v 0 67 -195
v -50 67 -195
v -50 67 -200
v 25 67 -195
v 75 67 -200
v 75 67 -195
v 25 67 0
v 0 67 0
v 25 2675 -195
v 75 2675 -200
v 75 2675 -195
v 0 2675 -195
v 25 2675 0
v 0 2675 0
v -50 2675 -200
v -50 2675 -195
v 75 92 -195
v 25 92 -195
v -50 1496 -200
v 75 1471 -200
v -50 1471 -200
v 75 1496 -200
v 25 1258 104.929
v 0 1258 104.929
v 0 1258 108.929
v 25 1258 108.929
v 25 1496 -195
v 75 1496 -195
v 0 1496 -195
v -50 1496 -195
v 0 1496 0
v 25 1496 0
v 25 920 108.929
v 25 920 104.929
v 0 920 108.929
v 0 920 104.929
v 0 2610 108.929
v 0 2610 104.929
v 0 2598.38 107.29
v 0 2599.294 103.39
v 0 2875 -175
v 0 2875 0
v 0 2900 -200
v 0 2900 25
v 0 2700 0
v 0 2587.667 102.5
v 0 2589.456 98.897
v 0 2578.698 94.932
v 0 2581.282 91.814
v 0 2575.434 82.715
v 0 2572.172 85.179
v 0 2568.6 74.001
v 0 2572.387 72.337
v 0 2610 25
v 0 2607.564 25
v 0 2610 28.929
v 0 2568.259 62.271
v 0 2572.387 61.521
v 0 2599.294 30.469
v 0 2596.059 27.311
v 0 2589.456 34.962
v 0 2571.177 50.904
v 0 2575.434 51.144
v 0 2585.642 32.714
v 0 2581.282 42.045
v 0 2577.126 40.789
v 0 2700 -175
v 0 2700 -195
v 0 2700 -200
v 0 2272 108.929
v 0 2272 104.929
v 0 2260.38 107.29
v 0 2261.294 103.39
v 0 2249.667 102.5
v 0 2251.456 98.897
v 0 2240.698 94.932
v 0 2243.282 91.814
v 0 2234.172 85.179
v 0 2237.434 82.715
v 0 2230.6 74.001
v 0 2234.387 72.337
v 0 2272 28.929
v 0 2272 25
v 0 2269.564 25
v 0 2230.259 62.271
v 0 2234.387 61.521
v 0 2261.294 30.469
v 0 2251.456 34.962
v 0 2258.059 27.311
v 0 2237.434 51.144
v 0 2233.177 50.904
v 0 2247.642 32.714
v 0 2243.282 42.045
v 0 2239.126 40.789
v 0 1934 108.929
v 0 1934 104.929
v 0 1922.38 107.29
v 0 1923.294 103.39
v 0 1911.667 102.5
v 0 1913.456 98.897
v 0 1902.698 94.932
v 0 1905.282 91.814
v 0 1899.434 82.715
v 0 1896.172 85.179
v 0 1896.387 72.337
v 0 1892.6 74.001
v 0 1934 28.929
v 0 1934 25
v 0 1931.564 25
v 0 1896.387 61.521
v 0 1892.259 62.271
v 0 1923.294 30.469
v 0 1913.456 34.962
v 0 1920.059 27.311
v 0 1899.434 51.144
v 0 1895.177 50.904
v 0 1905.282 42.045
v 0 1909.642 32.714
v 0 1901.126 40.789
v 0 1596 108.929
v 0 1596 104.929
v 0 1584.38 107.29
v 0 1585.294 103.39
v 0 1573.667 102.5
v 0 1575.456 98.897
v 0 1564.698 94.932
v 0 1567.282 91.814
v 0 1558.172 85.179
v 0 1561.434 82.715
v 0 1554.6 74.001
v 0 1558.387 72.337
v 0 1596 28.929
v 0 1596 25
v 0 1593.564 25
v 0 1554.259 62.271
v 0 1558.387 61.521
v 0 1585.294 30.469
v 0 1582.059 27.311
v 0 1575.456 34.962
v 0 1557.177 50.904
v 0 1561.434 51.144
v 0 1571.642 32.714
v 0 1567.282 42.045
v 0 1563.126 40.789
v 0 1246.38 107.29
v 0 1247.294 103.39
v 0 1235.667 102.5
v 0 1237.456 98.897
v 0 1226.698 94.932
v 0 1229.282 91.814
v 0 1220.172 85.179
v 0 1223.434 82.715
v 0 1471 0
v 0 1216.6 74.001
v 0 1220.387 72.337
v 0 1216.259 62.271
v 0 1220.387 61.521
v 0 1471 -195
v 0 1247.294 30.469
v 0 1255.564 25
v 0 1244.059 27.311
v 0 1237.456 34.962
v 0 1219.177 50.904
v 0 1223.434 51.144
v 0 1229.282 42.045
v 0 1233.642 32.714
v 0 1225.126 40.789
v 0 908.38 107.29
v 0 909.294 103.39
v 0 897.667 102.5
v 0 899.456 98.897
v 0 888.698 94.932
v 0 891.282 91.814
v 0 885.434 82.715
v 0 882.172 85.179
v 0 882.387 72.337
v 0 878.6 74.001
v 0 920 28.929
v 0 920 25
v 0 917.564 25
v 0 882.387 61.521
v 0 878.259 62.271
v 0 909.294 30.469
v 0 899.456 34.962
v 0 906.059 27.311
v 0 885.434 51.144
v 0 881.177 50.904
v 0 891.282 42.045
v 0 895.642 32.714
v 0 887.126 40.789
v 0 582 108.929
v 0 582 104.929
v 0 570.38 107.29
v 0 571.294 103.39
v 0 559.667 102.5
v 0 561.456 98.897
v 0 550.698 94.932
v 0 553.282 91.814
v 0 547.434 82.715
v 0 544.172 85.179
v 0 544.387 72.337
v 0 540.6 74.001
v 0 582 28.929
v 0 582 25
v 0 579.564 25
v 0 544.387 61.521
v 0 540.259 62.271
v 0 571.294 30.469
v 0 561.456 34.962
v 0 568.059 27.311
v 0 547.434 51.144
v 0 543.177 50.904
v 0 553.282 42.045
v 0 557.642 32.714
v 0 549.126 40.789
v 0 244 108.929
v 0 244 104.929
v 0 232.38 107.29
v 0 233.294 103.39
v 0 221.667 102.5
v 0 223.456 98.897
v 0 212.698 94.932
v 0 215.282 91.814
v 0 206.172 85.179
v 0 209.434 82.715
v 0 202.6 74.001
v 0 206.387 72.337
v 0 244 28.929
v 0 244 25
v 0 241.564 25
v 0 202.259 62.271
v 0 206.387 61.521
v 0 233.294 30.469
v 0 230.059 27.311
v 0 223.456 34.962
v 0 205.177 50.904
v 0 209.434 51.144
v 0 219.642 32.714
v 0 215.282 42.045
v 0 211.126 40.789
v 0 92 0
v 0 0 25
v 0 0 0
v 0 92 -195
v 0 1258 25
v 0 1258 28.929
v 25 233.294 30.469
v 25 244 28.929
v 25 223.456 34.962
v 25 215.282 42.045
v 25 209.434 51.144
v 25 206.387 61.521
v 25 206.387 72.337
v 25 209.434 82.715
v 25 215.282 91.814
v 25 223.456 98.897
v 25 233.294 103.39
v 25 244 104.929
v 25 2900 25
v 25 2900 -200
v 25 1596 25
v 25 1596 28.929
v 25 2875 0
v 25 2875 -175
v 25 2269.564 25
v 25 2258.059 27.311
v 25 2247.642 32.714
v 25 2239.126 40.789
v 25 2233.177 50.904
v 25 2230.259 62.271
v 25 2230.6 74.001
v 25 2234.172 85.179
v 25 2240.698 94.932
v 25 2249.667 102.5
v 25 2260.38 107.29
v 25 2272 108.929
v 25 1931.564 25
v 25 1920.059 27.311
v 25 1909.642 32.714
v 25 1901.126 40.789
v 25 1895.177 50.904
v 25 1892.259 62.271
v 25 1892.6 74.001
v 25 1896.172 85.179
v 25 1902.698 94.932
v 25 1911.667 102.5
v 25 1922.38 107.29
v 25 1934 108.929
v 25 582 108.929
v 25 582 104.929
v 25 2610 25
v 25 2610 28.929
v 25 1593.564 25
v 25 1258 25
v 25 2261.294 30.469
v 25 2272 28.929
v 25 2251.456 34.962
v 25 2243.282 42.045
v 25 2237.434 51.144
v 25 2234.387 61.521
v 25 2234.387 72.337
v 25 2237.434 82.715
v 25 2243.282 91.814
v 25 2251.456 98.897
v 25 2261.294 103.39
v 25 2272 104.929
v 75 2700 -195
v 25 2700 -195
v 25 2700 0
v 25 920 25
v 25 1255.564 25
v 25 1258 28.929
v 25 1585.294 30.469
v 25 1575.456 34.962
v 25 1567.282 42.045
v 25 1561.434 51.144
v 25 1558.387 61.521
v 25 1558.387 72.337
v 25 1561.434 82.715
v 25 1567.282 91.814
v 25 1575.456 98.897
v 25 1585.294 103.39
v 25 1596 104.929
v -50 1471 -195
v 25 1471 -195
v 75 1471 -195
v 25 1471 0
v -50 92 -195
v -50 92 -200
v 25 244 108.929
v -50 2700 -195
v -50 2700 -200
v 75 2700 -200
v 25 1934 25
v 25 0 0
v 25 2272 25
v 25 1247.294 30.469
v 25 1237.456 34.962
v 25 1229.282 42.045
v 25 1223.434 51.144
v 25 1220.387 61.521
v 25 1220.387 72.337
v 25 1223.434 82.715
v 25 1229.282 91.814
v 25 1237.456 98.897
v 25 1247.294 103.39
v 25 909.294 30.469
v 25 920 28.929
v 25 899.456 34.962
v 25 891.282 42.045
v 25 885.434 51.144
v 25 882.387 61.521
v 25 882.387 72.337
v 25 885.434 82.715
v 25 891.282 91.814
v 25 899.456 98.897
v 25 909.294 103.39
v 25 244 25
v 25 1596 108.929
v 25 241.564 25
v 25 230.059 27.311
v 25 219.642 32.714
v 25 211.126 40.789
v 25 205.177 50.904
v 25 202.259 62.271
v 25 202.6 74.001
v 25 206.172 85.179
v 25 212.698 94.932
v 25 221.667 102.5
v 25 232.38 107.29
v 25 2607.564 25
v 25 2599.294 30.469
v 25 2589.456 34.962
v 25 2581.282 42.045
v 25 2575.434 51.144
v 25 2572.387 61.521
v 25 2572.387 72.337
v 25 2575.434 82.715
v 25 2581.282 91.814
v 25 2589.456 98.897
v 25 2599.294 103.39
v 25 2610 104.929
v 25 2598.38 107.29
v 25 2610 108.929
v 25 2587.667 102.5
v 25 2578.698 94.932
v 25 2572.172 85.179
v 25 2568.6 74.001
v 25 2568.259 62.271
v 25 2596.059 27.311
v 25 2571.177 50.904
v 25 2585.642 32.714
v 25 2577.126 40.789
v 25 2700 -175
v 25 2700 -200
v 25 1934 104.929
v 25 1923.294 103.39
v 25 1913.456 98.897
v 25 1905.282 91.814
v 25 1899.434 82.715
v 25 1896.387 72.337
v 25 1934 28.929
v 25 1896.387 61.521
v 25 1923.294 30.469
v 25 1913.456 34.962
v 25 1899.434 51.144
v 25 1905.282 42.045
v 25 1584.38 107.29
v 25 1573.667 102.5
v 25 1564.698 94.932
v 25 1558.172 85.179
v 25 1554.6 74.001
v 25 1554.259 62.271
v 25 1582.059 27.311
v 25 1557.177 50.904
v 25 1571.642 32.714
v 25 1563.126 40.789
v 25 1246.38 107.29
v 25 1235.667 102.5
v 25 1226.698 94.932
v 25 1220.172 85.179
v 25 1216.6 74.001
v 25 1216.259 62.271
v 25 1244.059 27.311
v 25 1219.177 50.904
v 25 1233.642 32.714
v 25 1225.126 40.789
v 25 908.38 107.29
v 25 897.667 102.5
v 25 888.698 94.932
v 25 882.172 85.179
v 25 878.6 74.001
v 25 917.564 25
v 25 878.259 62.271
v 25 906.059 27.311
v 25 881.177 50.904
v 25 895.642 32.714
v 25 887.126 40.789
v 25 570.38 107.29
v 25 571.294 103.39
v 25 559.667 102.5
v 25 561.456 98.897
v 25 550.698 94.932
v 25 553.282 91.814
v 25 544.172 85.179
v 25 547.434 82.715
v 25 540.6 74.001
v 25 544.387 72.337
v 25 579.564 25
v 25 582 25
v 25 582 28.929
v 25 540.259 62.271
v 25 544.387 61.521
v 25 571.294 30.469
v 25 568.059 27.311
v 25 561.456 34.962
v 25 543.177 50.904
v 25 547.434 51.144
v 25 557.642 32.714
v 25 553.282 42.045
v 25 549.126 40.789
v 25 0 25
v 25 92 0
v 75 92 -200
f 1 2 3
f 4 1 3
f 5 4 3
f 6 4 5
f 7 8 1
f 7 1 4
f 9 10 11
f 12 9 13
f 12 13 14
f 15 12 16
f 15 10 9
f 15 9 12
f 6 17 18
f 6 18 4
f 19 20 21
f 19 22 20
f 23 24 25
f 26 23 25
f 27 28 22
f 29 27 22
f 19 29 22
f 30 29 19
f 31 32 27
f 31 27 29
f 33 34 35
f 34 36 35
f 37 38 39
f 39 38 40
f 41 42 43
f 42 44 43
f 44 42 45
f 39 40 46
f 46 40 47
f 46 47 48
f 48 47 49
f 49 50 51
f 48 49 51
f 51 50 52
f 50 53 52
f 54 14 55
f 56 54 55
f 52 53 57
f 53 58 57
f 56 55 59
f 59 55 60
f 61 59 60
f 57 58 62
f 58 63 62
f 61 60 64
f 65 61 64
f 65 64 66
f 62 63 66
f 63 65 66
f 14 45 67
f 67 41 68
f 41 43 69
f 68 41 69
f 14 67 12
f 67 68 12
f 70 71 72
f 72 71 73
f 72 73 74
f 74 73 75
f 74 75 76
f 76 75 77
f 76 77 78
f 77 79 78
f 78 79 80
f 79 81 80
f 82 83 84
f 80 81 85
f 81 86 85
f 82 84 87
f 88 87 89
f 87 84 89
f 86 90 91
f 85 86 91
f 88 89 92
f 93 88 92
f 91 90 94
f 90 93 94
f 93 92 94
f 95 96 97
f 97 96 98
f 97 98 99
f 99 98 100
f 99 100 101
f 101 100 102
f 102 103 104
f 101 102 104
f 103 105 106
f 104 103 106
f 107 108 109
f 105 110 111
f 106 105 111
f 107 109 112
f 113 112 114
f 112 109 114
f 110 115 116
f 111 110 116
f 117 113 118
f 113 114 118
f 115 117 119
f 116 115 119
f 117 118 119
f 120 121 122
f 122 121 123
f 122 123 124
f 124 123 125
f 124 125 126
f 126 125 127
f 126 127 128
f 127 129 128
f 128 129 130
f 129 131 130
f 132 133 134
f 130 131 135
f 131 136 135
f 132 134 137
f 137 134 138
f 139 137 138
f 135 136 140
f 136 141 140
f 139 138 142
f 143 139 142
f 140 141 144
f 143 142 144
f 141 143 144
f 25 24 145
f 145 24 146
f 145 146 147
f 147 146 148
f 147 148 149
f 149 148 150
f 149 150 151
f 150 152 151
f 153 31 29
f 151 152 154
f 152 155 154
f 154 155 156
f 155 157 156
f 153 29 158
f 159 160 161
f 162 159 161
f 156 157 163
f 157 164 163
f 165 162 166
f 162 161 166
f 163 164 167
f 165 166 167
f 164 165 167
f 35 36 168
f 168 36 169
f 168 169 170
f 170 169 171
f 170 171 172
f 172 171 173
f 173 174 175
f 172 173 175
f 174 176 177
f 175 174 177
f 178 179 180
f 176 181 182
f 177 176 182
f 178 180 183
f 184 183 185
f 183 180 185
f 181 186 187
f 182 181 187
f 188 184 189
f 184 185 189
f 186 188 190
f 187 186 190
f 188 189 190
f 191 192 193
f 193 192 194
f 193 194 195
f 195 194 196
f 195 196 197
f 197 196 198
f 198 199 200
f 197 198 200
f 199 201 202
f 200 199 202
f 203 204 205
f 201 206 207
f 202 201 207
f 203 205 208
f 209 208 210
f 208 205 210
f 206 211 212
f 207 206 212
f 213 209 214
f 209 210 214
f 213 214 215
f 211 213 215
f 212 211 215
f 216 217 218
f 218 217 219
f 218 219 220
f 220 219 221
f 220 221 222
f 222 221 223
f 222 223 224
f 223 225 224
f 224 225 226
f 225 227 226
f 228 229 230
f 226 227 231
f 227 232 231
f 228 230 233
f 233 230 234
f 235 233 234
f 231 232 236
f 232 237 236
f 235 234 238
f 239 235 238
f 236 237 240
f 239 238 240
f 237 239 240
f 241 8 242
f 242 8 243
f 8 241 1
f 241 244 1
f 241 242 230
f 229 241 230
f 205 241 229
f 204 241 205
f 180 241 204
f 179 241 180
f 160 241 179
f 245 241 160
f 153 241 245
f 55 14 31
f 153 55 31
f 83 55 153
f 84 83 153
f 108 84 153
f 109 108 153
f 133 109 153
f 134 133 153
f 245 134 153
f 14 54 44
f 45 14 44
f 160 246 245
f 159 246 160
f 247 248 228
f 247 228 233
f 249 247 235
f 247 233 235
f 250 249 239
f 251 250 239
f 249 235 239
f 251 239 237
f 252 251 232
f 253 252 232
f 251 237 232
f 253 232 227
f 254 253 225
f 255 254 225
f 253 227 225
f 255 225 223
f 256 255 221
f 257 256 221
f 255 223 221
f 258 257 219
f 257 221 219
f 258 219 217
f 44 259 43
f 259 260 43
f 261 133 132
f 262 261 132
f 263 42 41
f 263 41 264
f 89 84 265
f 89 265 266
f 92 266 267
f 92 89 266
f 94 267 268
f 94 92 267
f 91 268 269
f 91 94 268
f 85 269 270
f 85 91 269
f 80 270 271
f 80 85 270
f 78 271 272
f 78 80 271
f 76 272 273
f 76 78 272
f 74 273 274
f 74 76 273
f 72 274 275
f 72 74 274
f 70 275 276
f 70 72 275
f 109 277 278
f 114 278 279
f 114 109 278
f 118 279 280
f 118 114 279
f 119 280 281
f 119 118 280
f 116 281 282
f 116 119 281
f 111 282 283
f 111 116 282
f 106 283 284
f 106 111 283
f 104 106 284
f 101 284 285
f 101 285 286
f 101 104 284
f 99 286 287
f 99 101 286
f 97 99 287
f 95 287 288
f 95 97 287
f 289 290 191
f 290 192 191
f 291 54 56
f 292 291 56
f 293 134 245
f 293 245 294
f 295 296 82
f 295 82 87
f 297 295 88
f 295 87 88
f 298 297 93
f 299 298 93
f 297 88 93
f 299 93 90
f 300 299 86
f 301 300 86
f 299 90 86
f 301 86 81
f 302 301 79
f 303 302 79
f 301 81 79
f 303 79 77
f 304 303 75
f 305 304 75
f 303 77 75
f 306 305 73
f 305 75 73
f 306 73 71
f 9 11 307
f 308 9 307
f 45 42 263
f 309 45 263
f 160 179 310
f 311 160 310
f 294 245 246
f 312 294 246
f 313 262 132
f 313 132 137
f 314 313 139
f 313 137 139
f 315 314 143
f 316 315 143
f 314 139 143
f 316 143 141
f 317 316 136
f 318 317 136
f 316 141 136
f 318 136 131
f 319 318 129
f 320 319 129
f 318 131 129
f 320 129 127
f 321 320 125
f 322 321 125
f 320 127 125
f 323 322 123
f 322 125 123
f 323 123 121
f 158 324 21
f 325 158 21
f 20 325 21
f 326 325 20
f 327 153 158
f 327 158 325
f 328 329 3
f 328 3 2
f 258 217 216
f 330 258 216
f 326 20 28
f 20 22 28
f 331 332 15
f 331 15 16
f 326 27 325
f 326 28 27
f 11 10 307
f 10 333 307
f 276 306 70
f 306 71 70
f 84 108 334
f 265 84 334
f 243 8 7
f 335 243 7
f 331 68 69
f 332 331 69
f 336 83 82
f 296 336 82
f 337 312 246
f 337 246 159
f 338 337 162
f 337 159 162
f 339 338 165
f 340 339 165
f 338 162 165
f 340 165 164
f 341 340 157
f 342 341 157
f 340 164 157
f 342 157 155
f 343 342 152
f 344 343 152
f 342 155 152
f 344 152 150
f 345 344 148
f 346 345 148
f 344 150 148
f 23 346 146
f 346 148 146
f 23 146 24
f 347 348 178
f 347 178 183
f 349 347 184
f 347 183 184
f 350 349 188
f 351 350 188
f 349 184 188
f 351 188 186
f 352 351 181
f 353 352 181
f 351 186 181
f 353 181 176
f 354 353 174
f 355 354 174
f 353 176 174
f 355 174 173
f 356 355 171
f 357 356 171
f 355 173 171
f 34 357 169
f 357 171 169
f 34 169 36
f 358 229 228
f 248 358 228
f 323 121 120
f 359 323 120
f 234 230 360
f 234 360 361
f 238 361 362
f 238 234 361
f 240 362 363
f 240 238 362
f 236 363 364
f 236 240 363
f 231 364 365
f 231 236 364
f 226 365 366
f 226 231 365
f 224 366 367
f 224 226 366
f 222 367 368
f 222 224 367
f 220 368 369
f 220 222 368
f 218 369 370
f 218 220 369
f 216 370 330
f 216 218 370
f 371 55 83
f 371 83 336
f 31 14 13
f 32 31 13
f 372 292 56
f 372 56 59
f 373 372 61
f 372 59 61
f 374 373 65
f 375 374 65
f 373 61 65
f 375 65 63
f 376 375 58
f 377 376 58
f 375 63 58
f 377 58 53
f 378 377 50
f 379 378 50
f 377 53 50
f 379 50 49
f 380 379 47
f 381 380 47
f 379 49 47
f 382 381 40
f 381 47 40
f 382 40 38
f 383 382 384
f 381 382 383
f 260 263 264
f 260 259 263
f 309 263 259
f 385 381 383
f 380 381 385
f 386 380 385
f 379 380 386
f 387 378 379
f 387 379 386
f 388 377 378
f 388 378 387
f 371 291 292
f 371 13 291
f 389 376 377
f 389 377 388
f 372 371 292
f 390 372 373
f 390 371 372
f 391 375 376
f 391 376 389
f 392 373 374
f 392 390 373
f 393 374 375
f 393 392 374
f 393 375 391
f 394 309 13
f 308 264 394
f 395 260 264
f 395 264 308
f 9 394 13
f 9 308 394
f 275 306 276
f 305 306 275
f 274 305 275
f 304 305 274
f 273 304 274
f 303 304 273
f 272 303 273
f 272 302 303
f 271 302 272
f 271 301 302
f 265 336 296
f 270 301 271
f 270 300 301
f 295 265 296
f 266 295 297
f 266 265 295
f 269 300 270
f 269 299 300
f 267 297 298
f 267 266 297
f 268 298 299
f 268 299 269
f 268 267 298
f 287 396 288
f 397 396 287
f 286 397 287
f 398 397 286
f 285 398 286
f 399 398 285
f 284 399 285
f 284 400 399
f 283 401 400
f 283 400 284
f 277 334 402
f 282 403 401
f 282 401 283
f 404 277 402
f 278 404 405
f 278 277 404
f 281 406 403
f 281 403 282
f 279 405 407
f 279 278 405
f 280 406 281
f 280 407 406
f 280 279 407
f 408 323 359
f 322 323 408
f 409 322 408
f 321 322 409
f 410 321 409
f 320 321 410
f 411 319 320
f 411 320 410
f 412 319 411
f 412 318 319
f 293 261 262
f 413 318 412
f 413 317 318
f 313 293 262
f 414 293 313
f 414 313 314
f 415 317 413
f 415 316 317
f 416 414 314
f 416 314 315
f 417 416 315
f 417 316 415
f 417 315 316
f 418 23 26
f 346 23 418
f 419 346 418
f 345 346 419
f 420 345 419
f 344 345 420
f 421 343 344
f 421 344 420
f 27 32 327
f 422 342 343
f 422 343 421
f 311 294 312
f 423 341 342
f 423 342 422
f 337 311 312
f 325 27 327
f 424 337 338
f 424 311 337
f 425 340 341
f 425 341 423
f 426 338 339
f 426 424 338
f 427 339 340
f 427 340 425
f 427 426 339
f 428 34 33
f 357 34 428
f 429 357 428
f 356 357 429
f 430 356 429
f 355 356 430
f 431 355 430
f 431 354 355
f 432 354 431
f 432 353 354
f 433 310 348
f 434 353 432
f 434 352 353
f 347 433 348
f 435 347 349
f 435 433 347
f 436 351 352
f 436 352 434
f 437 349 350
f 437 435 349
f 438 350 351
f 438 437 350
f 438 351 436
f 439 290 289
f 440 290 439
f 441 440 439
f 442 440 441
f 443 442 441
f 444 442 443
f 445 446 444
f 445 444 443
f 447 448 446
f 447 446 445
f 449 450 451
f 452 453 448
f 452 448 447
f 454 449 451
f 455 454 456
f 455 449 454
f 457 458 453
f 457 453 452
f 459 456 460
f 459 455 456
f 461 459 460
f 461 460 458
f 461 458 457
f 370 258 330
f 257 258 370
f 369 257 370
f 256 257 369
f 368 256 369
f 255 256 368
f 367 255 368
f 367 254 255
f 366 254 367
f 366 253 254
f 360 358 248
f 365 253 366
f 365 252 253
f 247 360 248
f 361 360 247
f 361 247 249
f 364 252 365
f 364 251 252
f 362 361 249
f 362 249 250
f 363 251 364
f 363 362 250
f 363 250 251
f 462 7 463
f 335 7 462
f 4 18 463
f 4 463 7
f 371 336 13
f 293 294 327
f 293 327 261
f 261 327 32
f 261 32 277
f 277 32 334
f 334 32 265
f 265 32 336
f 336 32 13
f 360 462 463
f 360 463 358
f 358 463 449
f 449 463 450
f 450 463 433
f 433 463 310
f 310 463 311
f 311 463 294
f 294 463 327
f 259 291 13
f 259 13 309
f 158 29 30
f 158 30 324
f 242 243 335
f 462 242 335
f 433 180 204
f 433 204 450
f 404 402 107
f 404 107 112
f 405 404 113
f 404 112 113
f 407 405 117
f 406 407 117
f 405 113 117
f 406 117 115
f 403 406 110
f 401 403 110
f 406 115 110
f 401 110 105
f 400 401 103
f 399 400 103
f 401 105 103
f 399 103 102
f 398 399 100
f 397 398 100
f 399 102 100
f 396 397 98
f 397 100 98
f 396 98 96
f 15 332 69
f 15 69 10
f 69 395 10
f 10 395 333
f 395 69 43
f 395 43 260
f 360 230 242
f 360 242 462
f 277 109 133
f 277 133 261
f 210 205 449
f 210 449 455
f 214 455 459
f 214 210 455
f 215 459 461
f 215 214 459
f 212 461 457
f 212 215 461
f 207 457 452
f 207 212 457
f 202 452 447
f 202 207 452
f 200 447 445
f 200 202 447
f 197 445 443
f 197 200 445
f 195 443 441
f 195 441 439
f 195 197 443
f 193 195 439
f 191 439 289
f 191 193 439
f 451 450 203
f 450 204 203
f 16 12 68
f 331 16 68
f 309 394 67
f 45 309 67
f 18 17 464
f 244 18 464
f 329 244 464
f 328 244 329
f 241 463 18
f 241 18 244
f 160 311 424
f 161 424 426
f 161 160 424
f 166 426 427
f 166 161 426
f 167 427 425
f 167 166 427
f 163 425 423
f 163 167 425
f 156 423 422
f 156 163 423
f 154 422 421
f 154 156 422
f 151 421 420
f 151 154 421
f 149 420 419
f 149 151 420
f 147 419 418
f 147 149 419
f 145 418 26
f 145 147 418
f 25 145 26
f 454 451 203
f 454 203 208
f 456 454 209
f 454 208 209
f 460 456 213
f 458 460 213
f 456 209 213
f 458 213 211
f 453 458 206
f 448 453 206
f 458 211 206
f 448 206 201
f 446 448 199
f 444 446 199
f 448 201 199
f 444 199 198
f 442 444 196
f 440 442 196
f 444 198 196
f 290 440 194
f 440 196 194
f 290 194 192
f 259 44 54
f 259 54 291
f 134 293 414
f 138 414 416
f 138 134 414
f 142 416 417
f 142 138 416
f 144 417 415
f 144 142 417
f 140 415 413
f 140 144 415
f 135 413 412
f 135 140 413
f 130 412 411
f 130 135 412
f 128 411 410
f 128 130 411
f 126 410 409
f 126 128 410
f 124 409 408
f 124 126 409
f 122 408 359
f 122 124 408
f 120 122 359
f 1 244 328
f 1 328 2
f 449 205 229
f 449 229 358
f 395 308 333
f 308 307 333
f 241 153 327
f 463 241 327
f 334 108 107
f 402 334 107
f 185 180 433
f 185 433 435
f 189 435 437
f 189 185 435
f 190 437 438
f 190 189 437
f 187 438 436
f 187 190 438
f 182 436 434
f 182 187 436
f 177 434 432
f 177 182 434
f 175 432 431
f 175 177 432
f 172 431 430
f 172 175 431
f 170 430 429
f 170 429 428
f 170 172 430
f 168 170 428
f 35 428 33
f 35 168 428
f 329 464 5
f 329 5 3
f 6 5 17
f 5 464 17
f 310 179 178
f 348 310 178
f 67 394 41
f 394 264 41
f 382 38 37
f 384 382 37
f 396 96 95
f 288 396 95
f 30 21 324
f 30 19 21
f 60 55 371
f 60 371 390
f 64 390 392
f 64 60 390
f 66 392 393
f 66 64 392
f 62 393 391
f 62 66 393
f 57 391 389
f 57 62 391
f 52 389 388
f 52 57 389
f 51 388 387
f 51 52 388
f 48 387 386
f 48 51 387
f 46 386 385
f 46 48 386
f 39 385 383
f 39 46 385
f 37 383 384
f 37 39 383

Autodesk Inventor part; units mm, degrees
ref_plane "YZ Plane" through (0, 0, 0) normal (1, 0, 0) x (0, 1, 0)
ref_plane "XZ Plane" through (0, 0, 0) normal (0, 1, 0) x (-1, 0, 0)
ref_plane "XY Plane" through (0, 0, 0) normal (0, 0, 1) x (1, 0, 0)
sketch "Sketch1" plane through (0, 0, 0) normal (0, 0, 1) x (1, 0, 0)
  line L0 (0, 0) -> (25, 0)
  line L1 (25, 0) -> (25, 2900)
  line L2 (25, 2900) -> (0, 2900)
  line L3 (0, 2900) -> (0, 0)
  dimension "d0" = 25
  dimension "d1" = 2900
extrude "Extrusion1" add sketch "Sketch1" along normal blind 25
sketch "Sketch2" plane through (0, 0, 0) normal (0, 0, -1) x (-1, 0, 0)
  line L0 (-25, 0) -> (-25, 2900) projected
  line L1 (0, 2900) -> (0, 0) projected
  line L2 (-25, 2900) -> (0, 2900)
  line L3 (0, 2900) -> (0, 2875)
  line L4 (0, 2875) -> (-25, 2875)
  line L5 (-25, 2875) -> (-25, 2900)
  dimension "d4" = 25
extrude "Extrusion2" add sketch "Sketch2" along normal blind 200
sketch "Sketch3" plane through (0, 2875, 0) normal (0, -1, 0) x (1, 0, 0)
  line L0 (0, -200) -> (0, 25) projected
  line L1 (25, -200) -> (25, 25) projected
  line L2 (0, -200) -> (25, -200)
  line L3 (25, -200) -> (25, -175)
  line L4 (25, -175) -> (0, -175)
  line L5 (0, -175) -> (0, -200)
  point P0 (0, 0)
  dimension "d7" = 25
extrude "Extrusion3" add sketch "Sketch3" along normal blind 200
sketch "Sketch4" plane through (0, 2875, -175) normal (0, 0, 1) x (1, 0, 0)
  line L0 (25, -200) -> (0, -200) projected
  line L1 (25, 25) -> (25, -200) projected
  line L2 (0, -200) -> (25, -200)
  line L3 (25, -200) -> (25, -175)
  line L4 (25, -175) -> (0, -175)
  line L5 (0, -175) -> (0, -200)
  point P0 (0, -2875)
  dimension "d10" = 25
extrude "Extrusion4" add sketch "Sketch4" along normal up to next
sketch "Sketch6" plane through (0, 0, 25) normal (-1, 0, 0) x (0, 0, 1)
  line L0 (-225, 2900) -> (-225, 2675) projected
  line L1 (-225, 2675) -> (-220, 2675)
  line L2 (-220, 2675) -> (-220, 2700)
  line L3 (-220, 2700) -> (-225, 2700)
  line L4 (-225, 2700) -> (-225, 2675)
  point P0 (-25, 0)
  dimension "d13" = 5
  dimension "d14" = 25
extrude "Extrusion5" add sketch "Sketch6" along normal blind 50 and the other way blind 75
pattern_linear "Rectangular Pattern1" count 3 spacing 1404 along (0, -1, 0) of "Extrusion2"
sketch "Sketch7" plane through (0, 0, 25) normal (-1, 0, 0) x (0, 0, 1)
  line L0 (-225, 1496) -> (-225, 1471) projected
  line L1 (-25, 1471) -> (-225, 1471) projected
  line L2 (-225, 1496) -> (-220, 1496)
  line L3 (-220, 1496) -> (-220, 1471)
  line L4 (-220, 1471) -> (-225, 1471)
  line L5 (-225, 1471) -> (-225, 1496)
  point P0 (-25, 0)
  dimension "d22" = 5
extrude "Extrusion6" add sketch "Sketch7" along normal blind 50 and the other way blind 75
pattern_linear "Rectangular Pattern2" count 2 spacing 1404 along (0, -1, 0) of "Extrusion6"
sketch "Sketch8" plane through (0, 0, 25) normal (-1, 0, 0) x (0, 0, 1)
  arc A0 (-0.0707, 2610) -> (83.9293, 2610) centre (41.9293, 2610) ccw
  arc A1 (3.9293, 2610) -> (79.9293, 2610) centre (41.9293, 2610) ccw
  line L0 (-0.0707, 2610) -> (3.9293, 2610)
  line L1 (0, 0) -> (0, 2900) projected
  line L2 (79.9293, 2610) -> (83.9293, 2610)
  line L3 (0, 2900) -> (0, 0) projected
  line L4 (0, 2900) -> (42, 2900)
  point P0 (-25, 0)
  dimension "d31" = 4
  dimension "d39" = 42
  dimension "d40" = 290
extrude "Extrusion7" add sketch "Sketch8" against normal up to surface (25 mm away)
pattern_linear "Rectangular Pattern3" count 8 spacing 338 along (0, -1, 0) of "Extrusion7"
sketch "Sketch10" plane through (0, 2900, -200) normal (-1, 0, 0) x (0, 0, 1)
  line L0 (200, -2900) -> (225, -2900) projected
  line L1 (225, -2900) -> (267, -2900)
  dimension "d41" = 42
properties part number "Stand"
